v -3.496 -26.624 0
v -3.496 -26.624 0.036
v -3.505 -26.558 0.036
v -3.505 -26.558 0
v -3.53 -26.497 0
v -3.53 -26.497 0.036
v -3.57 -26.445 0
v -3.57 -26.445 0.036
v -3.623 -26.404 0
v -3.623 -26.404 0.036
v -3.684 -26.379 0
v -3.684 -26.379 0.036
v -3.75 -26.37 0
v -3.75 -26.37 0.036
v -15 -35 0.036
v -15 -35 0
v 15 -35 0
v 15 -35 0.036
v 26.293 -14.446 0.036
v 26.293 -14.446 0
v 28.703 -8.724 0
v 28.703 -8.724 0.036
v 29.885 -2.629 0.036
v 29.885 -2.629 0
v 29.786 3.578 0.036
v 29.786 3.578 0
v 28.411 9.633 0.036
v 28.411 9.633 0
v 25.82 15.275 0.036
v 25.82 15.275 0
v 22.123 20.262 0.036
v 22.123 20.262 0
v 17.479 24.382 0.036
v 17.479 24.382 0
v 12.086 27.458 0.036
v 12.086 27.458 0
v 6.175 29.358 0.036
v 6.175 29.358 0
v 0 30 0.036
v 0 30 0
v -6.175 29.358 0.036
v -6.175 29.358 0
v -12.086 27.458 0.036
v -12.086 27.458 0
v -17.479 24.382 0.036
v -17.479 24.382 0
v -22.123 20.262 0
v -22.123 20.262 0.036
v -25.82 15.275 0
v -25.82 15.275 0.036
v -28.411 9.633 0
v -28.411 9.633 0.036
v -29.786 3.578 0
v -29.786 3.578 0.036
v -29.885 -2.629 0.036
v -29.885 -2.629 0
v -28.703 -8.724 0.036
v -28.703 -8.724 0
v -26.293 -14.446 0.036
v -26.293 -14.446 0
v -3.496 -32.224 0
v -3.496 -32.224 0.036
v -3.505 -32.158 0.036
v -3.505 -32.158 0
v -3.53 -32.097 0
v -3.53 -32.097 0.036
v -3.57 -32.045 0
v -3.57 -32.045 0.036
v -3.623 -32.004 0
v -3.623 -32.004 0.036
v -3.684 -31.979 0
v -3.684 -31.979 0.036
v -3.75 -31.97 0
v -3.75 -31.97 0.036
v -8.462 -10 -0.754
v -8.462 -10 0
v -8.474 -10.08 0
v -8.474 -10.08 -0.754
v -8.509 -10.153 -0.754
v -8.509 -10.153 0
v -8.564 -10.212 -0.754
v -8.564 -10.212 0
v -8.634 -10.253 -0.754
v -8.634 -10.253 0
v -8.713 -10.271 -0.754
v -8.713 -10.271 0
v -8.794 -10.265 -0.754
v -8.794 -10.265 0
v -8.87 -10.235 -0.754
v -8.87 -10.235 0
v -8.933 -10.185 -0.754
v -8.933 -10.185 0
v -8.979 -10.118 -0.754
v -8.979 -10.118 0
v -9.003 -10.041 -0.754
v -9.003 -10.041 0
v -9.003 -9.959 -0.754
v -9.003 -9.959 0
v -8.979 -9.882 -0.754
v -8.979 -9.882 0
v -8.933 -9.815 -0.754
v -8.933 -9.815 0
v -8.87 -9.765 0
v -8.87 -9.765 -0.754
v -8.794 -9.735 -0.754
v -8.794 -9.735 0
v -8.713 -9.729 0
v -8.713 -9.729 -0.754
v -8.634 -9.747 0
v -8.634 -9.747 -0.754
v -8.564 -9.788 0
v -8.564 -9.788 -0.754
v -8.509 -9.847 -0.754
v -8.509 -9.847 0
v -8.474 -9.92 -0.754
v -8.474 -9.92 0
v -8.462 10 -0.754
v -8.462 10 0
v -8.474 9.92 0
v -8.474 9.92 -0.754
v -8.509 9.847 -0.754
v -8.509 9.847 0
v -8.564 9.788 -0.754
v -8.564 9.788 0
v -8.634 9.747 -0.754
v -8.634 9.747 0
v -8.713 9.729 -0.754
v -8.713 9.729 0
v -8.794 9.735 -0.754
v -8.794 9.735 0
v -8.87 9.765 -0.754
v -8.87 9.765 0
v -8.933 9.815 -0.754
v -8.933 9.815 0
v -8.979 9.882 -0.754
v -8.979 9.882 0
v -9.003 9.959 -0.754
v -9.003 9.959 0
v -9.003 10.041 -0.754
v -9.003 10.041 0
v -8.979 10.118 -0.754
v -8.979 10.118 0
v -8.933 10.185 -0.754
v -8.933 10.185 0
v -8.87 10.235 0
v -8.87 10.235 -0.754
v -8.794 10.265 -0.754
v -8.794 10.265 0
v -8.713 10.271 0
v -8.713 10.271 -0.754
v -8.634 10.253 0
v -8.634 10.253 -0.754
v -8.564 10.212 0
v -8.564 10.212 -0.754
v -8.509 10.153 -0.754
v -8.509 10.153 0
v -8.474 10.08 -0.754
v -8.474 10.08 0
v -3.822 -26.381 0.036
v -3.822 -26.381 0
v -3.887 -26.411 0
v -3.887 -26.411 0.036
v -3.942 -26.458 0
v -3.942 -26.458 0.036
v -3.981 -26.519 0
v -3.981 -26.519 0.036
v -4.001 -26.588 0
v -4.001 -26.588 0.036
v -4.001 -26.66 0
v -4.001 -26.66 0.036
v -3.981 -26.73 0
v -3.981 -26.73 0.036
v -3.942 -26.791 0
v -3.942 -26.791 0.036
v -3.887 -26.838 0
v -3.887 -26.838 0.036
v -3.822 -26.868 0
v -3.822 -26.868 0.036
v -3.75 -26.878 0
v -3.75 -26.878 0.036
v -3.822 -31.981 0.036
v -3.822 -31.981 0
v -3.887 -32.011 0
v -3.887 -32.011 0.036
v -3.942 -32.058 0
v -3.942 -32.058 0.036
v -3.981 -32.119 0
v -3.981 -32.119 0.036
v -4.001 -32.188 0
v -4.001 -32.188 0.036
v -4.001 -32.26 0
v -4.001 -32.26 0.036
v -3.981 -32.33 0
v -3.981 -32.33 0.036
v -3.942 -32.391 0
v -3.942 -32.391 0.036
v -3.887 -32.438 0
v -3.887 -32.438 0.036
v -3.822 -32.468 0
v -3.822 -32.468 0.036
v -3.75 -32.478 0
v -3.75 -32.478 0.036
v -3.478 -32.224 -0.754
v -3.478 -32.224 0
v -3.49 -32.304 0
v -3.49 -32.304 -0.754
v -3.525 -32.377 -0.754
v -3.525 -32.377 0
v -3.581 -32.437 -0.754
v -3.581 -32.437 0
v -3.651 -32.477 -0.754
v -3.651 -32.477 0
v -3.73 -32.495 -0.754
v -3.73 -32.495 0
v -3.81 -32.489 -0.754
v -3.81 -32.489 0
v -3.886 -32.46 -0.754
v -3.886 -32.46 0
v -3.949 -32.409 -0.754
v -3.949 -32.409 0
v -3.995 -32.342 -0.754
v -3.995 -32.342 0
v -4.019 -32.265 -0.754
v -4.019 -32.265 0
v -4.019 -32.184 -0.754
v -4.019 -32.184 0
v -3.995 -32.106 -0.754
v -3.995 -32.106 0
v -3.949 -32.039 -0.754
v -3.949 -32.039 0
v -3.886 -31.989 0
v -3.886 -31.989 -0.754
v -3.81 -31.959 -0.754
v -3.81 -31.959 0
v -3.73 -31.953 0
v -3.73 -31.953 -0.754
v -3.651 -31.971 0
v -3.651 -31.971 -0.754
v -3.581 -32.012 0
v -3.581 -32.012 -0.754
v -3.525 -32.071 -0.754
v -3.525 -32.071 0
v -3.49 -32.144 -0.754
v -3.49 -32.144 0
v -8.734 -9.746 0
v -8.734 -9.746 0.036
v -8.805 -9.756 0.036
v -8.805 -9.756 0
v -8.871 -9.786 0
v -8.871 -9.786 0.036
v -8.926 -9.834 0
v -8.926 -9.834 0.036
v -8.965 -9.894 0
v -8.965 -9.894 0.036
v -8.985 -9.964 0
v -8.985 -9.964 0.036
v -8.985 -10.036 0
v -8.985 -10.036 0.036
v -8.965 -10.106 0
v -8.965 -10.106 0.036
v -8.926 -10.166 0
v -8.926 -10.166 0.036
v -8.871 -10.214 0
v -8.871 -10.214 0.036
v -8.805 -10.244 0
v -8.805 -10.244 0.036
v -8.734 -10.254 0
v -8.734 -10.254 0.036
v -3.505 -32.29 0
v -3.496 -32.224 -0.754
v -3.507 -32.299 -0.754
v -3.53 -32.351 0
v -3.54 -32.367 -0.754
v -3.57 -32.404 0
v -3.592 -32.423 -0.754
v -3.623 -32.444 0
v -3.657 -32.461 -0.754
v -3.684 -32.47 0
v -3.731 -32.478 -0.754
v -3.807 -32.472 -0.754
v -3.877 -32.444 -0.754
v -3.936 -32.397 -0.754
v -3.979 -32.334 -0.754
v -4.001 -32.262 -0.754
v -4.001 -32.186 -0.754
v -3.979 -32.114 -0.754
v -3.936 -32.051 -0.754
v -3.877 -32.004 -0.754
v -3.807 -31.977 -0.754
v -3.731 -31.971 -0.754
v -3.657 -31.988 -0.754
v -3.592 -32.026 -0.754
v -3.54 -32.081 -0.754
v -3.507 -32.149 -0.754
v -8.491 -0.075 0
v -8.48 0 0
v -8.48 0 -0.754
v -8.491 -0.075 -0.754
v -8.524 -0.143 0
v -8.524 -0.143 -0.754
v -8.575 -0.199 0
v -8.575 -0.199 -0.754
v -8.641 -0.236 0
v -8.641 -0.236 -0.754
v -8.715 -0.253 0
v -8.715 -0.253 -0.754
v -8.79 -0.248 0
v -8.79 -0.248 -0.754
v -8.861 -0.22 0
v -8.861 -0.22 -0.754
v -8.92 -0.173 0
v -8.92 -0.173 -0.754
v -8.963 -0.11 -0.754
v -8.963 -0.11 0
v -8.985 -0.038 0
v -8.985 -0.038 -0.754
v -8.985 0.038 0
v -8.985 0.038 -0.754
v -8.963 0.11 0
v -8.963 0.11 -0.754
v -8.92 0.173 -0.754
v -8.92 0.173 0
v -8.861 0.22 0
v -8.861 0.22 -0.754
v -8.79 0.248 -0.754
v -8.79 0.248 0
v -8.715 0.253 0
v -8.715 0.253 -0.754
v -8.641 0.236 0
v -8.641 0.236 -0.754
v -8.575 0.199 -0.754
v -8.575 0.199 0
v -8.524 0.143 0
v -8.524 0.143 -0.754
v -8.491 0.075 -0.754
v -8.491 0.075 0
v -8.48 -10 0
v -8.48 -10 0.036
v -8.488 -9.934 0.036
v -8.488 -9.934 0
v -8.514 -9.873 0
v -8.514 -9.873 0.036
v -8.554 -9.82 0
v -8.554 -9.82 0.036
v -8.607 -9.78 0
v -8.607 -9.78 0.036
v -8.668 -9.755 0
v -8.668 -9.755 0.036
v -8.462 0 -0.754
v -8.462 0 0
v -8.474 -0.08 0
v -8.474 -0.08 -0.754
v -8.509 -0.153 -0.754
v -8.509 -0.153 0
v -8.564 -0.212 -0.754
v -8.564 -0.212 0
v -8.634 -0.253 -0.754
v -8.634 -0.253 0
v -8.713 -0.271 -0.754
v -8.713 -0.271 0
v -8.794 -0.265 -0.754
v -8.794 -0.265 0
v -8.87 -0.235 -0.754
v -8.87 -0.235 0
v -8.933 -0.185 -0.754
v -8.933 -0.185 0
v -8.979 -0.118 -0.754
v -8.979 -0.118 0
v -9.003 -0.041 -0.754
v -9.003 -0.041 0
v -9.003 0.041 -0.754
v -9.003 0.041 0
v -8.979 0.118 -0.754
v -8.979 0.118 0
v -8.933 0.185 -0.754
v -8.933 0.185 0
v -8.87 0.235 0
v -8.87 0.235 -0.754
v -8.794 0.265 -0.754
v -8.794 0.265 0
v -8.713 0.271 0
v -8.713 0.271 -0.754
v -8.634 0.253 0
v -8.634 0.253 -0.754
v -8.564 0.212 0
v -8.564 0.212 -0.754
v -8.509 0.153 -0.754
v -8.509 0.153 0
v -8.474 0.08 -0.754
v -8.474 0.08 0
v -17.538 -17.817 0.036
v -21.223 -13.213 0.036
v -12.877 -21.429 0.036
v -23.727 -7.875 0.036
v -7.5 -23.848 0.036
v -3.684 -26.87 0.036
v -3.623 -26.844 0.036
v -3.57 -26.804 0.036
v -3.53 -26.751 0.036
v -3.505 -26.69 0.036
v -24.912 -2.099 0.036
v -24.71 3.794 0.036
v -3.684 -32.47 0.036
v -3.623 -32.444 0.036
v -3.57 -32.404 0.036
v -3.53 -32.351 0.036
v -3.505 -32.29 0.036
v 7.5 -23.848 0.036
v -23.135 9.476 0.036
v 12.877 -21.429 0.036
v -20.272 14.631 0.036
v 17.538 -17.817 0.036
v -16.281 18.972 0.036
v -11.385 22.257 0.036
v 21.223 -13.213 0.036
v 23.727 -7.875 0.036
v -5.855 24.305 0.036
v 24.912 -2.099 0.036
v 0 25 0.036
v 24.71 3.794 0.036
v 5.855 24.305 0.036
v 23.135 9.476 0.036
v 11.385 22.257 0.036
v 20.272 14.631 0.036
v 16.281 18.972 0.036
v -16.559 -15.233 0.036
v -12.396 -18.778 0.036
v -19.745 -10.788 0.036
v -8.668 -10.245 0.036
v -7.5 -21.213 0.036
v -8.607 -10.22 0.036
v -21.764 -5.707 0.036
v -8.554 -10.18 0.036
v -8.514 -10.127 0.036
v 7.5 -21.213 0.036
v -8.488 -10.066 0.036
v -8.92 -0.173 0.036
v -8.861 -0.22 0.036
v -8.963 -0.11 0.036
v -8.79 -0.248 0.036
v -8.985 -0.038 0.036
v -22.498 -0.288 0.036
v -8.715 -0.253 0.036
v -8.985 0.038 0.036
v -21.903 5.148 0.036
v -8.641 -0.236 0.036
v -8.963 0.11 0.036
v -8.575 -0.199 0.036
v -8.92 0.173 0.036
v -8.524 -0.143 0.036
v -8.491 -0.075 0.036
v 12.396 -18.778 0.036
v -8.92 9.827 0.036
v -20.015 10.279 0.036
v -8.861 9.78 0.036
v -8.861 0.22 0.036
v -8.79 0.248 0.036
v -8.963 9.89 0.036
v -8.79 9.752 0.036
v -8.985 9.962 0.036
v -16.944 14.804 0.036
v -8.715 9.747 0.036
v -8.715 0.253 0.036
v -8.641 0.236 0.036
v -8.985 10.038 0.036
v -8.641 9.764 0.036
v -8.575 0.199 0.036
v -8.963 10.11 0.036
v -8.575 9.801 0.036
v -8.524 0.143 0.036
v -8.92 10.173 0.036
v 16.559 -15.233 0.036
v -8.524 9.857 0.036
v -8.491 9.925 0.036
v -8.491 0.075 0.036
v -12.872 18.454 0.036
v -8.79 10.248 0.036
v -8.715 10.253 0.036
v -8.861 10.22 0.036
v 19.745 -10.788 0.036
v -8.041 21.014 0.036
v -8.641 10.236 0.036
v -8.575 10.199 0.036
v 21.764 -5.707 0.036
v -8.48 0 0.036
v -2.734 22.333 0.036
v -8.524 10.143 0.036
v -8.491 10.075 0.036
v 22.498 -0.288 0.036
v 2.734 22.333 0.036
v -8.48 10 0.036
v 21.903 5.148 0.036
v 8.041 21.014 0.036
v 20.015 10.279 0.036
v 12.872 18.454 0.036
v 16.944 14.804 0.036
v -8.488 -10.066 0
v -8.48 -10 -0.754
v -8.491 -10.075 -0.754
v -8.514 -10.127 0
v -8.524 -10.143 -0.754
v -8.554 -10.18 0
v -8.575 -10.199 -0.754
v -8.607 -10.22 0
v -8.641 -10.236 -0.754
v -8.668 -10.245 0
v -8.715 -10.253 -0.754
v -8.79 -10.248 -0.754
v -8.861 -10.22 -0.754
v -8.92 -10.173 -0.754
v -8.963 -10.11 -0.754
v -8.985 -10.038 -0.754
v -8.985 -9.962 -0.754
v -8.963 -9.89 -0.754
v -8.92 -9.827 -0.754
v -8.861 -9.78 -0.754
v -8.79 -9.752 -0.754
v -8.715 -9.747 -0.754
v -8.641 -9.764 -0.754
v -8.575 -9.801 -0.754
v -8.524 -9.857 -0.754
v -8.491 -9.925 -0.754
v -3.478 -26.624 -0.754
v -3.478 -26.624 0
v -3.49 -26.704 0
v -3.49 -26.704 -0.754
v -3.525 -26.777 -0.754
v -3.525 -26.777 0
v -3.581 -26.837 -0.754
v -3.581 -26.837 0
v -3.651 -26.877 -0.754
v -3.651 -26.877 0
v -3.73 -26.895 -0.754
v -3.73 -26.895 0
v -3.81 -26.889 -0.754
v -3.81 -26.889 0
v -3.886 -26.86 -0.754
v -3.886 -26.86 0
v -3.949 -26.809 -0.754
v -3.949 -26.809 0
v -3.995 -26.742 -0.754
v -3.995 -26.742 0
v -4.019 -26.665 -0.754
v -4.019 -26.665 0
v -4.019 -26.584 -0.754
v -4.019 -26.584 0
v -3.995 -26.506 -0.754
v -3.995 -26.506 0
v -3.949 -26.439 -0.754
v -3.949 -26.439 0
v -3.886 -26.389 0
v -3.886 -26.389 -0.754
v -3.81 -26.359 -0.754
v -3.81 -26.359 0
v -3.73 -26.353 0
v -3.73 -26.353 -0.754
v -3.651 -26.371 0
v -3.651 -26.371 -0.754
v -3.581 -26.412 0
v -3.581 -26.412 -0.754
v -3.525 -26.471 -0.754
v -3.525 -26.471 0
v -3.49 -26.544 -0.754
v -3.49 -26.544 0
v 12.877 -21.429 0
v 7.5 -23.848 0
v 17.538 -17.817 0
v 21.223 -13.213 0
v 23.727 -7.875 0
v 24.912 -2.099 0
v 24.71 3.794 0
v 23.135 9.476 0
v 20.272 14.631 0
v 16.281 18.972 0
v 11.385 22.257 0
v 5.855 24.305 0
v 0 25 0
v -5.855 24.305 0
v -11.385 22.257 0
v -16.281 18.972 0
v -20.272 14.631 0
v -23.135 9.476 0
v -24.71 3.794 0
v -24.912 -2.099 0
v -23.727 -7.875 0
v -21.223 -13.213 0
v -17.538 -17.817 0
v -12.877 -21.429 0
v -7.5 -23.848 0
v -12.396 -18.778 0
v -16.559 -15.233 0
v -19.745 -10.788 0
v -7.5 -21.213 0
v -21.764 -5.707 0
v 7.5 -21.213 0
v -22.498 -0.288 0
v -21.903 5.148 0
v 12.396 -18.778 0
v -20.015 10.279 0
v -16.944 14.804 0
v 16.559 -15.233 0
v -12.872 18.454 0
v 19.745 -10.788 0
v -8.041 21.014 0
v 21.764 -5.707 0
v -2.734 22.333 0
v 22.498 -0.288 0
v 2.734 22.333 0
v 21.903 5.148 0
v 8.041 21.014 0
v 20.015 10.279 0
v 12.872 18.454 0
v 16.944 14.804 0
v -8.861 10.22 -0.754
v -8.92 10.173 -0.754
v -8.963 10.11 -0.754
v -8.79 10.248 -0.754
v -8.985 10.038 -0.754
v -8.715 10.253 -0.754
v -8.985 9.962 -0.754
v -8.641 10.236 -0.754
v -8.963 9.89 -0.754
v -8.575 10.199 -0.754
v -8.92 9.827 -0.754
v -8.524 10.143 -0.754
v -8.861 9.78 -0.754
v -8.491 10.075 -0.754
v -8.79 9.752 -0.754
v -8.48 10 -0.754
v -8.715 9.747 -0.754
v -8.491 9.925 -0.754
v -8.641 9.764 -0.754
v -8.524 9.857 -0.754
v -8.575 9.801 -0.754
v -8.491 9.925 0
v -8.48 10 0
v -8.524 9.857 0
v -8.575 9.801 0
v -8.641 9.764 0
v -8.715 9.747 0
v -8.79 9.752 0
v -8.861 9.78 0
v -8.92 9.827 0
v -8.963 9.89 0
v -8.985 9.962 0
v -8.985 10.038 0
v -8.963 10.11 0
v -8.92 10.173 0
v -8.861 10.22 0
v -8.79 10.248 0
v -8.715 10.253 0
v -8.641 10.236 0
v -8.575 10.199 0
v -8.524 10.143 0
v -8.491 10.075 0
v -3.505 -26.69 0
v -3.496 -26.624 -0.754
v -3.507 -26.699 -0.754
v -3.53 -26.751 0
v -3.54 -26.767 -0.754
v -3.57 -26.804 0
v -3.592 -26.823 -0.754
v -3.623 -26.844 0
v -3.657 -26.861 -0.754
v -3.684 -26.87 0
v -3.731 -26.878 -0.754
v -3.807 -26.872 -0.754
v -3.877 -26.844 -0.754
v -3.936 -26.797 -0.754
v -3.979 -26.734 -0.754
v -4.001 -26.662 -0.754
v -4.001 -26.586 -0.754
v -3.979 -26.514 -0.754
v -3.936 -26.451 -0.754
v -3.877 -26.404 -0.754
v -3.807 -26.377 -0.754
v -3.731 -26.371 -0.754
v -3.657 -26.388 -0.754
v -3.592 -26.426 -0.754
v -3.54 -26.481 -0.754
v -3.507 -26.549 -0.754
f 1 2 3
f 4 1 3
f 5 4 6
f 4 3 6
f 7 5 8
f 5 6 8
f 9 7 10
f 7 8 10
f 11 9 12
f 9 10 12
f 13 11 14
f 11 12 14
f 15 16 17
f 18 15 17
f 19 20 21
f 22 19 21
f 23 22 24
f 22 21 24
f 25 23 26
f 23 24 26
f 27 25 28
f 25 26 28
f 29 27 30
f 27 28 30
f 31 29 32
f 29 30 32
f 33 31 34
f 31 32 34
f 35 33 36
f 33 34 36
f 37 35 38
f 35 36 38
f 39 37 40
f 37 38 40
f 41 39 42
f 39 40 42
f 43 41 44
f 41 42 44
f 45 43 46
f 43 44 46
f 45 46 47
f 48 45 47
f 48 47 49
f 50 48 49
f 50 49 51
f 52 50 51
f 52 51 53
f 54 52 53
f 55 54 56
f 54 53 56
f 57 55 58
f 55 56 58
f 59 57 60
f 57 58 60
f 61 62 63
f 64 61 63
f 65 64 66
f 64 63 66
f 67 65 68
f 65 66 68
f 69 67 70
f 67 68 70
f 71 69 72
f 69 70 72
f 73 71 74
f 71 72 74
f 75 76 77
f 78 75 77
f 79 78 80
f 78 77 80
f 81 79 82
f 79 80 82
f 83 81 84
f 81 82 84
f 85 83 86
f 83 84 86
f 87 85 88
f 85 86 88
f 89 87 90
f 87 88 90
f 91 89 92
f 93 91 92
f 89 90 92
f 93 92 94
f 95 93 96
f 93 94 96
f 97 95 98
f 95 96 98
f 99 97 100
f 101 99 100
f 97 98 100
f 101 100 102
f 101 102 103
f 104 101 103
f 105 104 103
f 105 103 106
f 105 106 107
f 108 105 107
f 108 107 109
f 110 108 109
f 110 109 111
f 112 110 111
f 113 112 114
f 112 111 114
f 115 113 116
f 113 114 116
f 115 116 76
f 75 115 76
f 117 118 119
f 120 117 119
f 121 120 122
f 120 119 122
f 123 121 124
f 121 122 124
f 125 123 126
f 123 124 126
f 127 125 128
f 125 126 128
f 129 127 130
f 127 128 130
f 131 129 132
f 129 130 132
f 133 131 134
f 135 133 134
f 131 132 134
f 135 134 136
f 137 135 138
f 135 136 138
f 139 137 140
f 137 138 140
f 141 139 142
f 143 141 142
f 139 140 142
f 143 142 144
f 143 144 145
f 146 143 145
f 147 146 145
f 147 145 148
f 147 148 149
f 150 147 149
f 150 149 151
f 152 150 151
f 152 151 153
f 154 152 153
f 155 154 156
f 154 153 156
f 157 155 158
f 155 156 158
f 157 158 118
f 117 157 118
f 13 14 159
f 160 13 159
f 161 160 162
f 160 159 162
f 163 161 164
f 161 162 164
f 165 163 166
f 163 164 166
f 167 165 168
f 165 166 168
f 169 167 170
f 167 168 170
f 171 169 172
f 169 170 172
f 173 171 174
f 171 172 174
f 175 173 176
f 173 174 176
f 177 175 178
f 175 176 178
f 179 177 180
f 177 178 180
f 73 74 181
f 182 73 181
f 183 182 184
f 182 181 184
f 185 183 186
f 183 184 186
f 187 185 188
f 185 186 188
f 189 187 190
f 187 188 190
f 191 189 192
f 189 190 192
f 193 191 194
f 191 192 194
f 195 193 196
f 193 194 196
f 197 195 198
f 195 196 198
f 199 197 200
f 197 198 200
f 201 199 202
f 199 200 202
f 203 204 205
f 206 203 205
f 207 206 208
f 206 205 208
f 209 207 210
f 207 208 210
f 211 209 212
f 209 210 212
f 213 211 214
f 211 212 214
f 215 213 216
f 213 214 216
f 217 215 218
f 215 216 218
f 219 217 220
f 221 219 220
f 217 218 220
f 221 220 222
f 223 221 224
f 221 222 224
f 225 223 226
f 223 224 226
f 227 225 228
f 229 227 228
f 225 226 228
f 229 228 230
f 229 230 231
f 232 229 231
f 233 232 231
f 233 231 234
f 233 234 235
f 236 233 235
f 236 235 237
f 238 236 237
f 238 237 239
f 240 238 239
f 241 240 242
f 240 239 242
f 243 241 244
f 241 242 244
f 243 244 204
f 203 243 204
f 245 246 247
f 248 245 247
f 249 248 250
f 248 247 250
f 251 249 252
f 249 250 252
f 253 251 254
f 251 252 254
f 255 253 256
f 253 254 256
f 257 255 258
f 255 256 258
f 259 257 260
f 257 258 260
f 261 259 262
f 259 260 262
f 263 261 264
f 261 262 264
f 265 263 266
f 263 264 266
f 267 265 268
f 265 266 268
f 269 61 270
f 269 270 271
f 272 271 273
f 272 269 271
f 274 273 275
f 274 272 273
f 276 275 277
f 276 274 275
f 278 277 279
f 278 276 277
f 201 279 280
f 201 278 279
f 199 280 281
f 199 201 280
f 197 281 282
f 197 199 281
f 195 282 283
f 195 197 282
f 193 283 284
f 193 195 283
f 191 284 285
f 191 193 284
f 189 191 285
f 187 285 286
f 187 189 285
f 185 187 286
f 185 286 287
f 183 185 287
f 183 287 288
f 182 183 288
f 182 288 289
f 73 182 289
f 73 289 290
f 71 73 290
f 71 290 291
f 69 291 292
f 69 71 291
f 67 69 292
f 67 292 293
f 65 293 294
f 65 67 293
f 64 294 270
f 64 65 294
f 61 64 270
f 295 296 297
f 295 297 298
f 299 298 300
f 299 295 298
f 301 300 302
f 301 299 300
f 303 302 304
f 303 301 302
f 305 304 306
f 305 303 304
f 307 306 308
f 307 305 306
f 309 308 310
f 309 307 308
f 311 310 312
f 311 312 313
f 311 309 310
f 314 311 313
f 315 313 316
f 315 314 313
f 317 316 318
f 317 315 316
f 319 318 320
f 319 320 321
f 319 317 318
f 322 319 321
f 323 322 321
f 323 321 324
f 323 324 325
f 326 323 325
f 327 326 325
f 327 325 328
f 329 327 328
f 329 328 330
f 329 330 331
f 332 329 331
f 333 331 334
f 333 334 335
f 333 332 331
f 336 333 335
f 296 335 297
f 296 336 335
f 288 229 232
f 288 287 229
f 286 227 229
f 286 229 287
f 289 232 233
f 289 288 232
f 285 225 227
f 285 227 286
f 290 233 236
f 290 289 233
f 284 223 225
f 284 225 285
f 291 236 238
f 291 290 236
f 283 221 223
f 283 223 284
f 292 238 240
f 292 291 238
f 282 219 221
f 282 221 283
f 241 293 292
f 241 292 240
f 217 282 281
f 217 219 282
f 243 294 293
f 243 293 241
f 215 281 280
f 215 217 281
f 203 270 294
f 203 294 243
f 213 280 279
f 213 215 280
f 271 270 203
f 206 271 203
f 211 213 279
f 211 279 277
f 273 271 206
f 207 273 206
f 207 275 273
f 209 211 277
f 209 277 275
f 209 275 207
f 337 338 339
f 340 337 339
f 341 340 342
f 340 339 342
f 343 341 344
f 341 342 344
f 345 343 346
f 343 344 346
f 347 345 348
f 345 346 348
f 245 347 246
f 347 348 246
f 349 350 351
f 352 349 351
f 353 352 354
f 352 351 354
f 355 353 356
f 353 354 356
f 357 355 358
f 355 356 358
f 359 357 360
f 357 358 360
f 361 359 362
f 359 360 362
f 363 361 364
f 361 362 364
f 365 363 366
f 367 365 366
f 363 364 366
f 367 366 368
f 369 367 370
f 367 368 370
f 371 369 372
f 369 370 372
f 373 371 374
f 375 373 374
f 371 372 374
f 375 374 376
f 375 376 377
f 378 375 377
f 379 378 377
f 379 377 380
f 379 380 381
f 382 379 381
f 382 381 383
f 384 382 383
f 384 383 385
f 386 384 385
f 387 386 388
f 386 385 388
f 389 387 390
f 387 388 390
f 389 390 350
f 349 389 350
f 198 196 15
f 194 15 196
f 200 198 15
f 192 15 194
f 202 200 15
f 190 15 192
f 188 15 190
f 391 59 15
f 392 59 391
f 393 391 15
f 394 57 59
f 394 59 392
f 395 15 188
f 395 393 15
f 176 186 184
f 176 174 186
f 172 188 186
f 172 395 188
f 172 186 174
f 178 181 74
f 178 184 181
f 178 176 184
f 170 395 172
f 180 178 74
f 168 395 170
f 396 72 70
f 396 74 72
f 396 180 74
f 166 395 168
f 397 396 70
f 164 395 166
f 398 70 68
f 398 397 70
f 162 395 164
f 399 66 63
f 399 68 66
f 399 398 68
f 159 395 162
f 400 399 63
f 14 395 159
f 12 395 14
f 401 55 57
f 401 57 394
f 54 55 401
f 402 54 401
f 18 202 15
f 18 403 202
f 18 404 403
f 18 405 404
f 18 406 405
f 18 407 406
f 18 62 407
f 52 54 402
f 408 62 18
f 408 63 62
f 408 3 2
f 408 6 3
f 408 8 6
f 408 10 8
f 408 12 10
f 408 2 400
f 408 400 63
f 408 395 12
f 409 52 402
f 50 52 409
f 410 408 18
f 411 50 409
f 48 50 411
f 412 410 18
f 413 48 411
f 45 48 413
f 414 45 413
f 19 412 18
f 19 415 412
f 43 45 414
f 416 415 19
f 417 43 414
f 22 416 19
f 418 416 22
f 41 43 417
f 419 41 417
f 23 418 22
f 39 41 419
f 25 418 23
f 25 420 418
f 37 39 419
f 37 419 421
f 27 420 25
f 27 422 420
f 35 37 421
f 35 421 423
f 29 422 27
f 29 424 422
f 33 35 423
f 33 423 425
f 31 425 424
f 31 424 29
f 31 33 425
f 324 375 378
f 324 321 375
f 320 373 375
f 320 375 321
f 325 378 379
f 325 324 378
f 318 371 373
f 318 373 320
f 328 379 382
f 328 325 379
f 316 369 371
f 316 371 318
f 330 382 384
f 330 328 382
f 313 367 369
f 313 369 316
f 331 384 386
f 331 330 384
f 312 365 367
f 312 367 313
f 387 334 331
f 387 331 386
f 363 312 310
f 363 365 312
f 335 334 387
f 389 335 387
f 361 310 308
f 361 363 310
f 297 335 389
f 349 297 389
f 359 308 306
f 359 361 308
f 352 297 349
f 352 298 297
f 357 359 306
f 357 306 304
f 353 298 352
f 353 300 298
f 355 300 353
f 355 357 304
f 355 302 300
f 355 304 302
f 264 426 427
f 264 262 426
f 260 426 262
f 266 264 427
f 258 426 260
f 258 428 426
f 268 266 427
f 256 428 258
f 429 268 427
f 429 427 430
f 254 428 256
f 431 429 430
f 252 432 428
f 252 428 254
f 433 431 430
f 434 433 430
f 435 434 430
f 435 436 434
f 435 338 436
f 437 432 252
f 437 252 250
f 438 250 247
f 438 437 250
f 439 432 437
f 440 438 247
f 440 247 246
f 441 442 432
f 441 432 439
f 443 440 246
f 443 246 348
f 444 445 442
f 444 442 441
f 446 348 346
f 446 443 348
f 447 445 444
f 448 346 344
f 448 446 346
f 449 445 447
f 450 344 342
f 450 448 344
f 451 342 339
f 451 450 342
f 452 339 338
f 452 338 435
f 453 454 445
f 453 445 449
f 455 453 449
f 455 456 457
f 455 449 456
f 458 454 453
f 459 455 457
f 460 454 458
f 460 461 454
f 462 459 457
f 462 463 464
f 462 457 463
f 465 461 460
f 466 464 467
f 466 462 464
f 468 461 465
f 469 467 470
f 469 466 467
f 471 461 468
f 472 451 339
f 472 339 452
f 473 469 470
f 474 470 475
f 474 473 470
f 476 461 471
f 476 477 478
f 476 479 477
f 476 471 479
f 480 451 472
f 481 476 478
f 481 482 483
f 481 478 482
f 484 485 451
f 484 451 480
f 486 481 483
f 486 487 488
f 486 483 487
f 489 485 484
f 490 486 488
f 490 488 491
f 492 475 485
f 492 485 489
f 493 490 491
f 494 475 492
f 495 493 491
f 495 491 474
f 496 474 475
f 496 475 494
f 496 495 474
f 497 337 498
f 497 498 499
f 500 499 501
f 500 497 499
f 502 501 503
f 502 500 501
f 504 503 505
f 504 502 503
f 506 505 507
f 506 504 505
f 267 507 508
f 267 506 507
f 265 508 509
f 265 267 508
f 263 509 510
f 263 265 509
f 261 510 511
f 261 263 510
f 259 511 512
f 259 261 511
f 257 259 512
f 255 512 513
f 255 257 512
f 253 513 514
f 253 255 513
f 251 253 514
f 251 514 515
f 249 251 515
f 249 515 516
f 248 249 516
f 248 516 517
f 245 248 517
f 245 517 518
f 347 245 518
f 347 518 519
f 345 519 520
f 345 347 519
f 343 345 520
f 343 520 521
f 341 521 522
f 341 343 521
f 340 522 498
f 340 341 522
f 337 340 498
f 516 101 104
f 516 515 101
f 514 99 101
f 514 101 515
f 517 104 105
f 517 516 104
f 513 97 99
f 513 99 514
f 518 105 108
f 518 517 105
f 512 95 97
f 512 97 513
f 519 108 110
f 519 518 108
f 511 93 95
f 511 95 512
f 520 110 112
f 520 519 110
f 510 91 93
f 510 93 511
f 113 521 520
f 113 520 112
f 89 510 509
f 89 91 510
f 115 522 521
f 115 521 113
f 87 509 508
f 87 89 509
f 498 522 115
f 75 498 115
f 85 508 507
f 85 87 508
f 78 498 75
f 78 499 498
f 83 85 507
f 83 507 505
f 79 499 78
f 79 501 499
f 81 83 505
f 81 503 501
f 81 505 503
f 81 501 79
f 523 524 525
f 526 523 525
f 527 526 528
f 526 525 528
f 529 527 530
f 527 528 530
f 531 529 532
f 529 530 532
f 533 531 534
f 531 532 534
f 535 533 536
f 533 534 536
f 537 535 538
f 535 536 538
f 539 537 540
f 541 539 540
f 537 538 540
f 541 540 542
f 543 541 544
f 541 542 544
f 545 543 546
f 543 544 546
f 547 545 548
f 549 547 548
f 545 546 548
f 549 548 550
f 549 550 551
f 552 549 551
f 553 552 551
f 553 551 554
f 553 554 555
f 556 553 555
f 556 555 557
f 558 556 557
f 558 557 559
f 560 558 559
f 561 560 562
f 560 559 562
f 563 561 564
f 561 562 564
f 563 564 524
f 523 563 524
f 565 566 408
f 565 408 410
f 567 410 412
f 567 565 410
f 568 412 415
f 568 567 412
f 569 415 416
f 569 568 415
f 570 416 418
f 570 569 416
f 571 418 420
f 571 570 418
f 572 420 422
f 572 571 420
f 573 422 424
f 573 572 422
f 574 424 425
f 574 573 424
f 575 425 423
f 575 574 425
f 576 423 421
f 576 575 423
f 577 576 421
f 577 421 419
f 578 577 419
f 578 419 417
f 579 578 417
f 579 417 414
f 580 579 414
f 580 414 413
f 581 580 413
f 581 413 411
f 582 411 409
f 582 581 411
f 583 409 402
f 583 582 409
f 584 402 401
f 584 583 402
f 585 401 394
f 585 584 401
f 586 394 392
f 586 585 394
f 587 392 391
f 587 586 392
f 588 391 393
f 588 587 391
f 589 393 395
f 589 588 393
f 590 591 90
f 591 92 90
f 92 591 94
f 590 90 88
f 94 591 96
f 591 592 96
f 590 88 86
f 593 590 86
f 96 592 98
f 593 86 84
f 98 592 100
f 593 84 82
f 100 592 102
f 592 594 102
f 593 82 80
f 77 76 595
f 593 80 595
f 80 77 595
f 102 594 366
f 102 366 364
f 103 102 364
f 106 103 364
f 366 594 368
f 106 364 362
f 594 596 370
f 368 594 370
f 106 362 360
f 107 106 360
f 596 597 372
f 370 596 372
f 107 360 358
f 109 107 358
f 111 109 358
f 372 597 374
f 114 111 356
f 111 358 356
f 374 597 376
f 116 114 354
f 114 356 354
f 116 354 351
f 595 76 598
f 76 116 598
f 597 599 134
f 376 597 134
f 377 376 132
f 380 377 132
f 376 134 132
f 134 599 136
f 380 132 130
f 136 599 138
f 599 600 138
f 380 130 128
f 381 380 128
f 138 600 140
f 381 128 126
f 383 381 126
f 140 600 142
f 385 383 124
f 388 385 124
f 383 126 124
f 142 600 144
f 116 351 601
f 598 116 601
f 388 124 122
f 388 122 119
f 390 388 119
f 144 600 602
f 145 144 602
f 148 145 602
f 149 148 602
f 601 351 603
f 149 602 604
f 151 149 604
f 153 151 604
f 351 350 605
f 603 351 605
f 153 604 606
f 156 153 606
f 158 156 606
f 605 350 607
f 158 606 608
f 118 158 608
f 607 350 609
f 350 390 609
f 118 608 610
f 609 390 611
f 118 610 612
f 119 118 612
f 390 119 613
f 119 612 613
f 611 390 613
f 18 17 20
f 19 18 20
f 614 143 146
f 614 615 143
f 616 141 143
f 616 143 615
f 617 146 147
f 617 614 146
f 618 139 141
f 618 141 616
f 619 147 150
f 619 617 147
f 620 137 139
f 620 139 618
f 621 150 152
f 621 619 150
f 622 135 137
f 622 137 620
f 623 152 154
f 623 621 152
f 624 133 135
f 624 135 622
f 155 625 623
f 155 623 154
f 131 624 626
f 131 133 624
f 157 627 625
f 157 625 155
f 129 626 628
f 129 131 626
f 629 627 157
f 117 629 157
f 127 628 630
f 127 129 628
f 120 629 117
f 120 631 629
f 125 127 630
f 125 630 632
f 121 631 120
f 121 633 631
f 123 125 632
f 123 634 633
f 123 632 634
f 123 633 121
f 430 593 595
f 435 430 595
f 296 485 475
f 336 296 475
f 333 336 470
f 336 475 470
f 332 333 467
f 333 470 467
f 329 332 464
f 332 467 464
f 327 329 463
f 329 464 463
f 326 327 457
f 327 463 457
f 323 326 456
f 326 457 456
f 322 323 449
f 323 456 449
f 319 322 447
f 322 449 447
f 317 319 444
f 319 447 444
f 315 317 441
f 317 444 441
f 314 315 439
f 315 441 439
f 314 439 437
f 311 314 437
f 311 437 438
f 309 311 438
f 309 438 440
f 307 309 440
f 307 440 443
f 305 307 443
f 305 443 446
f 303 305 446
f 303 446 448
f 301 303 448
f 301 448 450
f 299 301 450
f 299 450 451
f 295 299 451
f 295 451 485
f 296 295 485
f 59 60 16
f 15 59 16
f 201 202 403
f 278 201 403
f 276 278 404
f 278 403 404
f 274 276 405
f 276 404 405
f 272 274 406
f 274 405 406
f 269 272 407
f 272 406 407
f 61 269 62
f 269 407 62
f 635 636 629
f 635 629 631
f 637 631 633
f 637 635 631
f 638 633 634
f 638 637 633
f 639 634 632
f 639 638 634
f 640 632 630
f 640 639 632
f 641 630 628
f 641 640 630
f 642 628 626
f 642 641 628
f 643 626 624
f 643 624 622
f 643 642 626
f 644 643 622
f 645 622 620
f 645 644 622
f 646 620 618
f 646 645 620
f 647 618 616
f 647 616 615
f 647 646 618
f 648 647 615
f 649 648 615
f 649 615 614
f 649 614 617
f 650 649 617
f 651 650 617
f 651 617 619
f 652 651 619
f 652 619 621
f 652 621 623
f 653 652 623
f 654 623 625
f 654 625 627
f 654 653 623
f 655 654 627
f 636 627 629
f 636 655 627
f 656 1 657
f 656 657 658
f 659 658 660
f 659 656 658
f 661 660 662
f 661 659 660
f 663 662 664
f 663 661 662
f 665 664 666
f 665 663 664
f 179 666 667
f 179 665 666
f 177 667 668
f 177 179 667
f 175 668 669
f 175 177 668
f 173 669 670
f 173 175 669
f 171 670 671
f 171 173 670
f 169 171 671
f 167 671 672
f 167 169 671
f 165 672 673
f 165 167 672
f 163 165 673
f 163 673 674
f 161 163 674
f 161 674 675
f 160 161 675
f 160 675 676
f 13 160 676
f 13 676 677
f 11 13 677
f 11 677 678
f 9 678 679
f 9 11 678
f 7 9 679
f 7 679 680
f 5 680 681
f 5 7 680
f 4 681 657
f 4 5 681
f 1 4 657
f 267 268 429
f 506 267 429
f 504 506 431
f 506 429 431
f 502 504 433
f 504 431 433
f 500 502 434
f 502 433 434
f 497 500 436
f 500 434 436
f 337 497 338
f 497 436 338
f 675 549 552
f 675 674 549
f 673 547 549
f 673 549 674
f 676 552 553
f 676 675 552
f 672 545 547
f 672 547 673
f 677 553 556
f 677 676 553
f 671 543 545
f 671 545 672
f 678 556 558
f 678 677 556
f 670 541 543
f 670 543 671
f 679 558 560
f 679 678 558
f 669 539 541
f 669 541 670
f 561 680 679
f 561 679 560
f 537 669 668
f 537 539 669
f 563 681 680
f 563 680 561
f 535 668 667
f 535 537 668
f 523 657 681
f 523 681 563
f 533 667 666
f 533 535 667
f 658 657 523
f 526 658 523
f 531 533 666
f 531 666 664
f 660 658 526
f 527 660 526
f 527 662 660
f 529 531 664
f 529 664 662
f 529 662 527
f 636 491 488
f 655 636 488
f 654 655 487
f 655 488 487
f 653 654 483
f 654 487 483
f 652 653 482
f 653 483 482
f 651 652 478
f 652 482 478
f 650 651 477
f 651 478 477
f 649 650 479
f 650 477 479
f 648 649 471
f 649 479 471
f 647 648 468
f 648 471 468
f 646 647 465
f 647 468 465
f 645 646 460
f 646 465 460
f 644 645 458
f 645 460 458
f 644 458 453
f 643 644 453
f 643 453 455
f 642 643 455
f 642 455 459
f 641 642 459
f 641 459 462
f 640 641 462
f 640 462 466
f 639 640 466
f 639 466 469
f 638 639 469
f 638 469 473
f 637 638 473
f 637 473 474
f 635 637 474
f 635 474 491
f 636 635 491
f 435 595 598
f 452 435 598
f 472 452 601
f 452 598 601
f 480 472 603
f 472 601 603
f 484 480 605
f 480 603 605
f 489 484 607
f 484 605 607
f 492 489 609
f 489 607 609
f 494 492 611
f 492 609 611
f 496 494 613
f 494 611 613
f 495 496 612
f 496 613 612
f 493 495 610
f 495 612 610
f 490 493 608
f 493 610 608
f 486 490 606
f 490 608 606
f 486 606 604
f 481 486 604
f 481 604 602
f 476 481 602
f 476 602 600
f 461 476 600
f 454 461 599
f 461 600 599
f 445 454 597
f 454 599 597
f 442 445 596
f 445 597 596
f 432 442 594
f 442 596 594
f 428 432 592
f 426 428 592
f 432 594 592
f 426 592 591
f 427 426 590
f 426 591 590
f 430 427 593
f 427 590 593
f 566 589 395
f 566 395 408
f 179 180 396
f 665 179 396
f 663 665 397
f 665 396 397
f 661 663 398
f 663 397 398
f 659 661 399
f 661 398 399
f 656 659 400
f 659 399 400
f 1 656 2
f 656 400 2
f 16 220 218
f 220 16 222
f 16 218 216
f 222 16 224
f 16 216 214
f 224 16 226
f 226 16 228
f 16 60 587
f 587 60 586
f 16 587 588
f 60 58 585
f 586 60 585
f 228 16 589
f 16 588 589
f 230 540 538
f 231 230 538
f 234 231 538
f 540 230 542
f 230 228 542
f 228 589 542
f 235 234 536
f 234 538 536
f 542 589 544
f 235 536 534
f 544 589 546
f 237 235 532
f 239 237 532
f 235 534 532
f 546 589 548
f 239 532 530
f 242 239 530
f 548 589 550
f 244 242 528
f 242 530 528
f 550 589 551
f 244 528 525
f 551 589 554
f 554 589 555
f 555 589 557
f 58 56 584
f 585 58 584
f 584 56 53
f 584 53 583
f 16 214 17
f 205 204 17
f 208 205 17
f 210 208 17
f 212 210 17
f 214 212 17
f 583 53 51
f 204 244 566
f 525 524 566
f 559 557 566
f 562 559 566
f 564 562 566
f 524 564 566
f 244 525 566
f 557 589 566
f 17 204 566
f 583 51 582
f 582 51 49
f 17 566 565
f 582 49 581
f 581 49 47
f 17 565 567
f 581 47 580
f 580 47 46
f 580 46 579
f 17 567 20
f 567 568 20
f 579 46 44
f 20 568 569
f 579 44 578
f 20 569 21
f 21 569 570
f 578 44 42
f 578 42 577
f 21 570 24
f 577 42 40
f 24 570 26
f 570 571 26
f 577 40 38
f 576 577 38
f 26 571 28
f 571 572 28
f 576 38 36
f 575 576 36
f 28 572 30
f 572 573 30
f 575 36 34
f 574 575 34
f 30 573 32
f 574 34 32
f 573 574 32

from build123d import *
from build123d.topology import SkipClean

# Parameters (mm, degrees)
BOSS_EXTRUDE1_DEPTH      = 0.03556
BOSS_EXTRUDE1_2_DEPTH    = 0.03556
SKETCH2_R                = 0.254
CUT_EXTRUDE1_DEPTH       = 10
ESBO_O1_R                = 0.27178
ESBO_O1_R_2              = 0.254
RESSALTO_EXTRUS_O1_DEPTH = 0.75438


with BuildPart() as part:
    # Sketch1 → Boss-Extrude1 (new body)
    with BuildSketch(Plane.XY):
        with BuildLine():
            Line((-7.500000004, -21.213203434), (7.500000004, -21.213203434))
            ThreePointArc((7.500000004, -21.213203434), (0, 22.5), (-7.500000004, -21.213203434))
        make_face()
    extrude(amount=BOSS_EXTRUDE1_DEPTH)


with BuildPart() as body_2:
    # Sketch1 → Boss-Extrude1 2 (new body)
    with BuildSketch(Plane.XY):
        with BuildLine():
            Line((-15, -35.000000034), (15, -35.000000034))
            Line((15, -35.000000034), (26.292884658, -14.445906561))
            ThreePointArc((26.292884658, -14.445906561), (0, 30), (-26.292884658, -14.445906561))
            Line((-26.292884658, -14.445906561), (-15, -35.000000034))
        make_face()
        with BuildLine():
            Line((-7.500000004, -23.848480034), (7.500000004, -23.848480034))
            ThreePointArc((7.500000004, -23.848480034), (0, 25), (-7.500000004, -23.848480034))
        make_face(mode=Mode.SUBTRACT)
    extrude(amount=BOSS_EXTRUDE1_2_DEPTH)


with BuildPart() as cut_extrude1_tool:
    # Sketch2 → Cut-Extrude1 (new body)
    with BuildSketch(Plane.XY.offset(0.03556)):
        with BuildLine():
            ThreePointArc((-3.496000002, -32.224240034), (-3.57039488, -32.044634912), (-3.750000002, -31.970240034))
            Line((-3.750000002, -31.970240034), (-3.750000002, -32.478240034))
            ThreePointArc((-3.750000002, -32.478240034), (-3.57039488, -32.403845156), (-3.496000002, -32.224240034))
        make_face()
        with BuildLine():
            Line((-3.750000002, -32.478240034), (-3.750000002, -31.970240034))
            ThreePointArc((-3.750000002, -31.970240034), (-4.004000002, -32.224240034), (-3.750000002, -32.478240034))
        make_face()
        with BuildLine():
            ThreePointArc((-3.496000002, -26.624240034), (-3.57039488, -26.444634912), (-3.750000002, -26.370240034))
            Line((-3.750000002, -26.370240034), (-3.750000002, -26.878240034))
            ThreePointArc((-3.750000002, -26.878240034), (-3.57039488, -26.803845156), (-3.496000002, -26.624240034))
        make_face()
        with BuildLine():
            Line((-3.750000002, -26.878240034), (-3.750000002, -26.370240034))
            ThreePointArc((-3.750000002, -26.370240034), (-4.004000002, -26.624240034), (-3.750000002, -26.878240034))
        make_face()
        with BuildLine():
            ThreePointArc((-8.479792148, -10), (-8.554187026, -9.820394878), (-8.733792148, -9.746))
            Line((-8.733792148, -9.746), (-8.733792148, -10.254))
            ThreePointArc((-8.733792148, -10.254), (-8.554187026, -10.179605122), (-8.479792148, -10))
        make_face()
        with BuildLine():
            Line((-8.733792148, -10.254), (-8.733792148, -9.746))
            ThreePointArc((-8.733792148, -9.746), (-8.987792148, -10), (-8.733792148, -10.254))
        make_face()
        with Locations((-8.733792148, 0)):
            Circle(SKETCH2_R)
        with Locations((-8.733792148, 10)):
            Circle(SKETCH2_R)
    extrude(amount=-CUT_EXTRUDE1_DEPTH)


with BuildPart() as part_1:
    add(part.part)

    # Cut-Extrude1: cut by cut_extrude1_tool
    add(cut_extrude1_tool.part, mode=Mode.SUBTRACT)



with BuildPart() as body_2_1:
    add(body_2.part)

    # Cut-Extrude1: cut by cut_extrude1_tool
    add(cut_extrude1_tool.part, mode=Mode.SUBTRACT)


with BuildPart() as part_2:
    with SkipClean():  # the faces are left unmerged after this step: merging them gives an invalid solid
        add(part_1.part)

        add(body_2_1.part)  # Ressalto-extrusão1 merges body 2
        # Esboço1 → Ressalto-extrusão1 (add)
        # profile 1 of 5: a face of its own
        with BuildSketch(Plane(origin=(0, 0, 0), x_dir=(-1, 0, 0), z_dir=(0, 0, -1))):
            with Locations(Location((8.733792148, 10, 0), (0, 0, 180))):
                Circle(ESBO_O1_R)
            with Locations(Location((8.733792148, 10, 0), (0, 0, 180))):
                Circle(ESBO_O1_R_2, mode=Mode.SUBTRACT)
        # profile 2 of 5: a face of its own
        with BuildSketch(Plane(origin=(0, 0, 0), x_dir=(-1, 0, 0), z_dir=(0, 0, -1))):
            with Locations(Location((8.733792148, 0, 0), (0, 0, 180))):
                Circle(ESBO_O1_R)
            with Locations(Location((8.733792148, 0, 0), (0, 0, 180))):
                Circle(ESBO_O1_R_2, mode=Mode.SUBTRACT)
        # profile 3 of 5: a face of its own
        with BuildSketch(Plane(origin=(0, 0, 0), x_dir=(-1, 0, 0), z_dir=(0, 0, -1))):
            with Locations(Location((8.733792148, -10, 0), (0, 0, 180))):
                Circle(ESBO_O1_R)
            with Locations(Location((8.733792148, -10, 0), (0, 0, 180))):
                Circle(ESBO_O1_R_2, mode=Mode.SUBTRACT)
        # profile 4 of 5: a face of its own
        with BuildSketch(Plane(origin=(0, 0, 0), x_dir=(-1, 0, 0), z_dir=(0, 0, -1))):
            with Locations(Location((3.750000002, -26.624240034, 0), (0, 0, 180))):
                Circle(ESBO_O1_R)
            with Locations(Location((3.750000002, -26.624240034, 0), (0, 0, 180))):
                Circle(ESBO_O1_R_2, mode=Mode.SUBTRACT)
        # profile 5 of 5: a face of its own
        with BuildSketch(Plane(origin=(0, 0, 0), x_dir=(-1, 0, 0), z_dir=(0, 0, -1))):
            with Locations(Location((3.750000002, -32.224240034, 0), (0, 0, 180))):
                Circle(ESBO_O1_R)
            with Locations(Location((3.750000002, -32.224240034, 0), (0, 0, 180))):
                Circle(ESBO_O1_R_2, mode=Mode.SUBTRACT)
        extrude(amount=RESSALTO_EXTRUS_O1_DEPTH)


solid = part_2.part
